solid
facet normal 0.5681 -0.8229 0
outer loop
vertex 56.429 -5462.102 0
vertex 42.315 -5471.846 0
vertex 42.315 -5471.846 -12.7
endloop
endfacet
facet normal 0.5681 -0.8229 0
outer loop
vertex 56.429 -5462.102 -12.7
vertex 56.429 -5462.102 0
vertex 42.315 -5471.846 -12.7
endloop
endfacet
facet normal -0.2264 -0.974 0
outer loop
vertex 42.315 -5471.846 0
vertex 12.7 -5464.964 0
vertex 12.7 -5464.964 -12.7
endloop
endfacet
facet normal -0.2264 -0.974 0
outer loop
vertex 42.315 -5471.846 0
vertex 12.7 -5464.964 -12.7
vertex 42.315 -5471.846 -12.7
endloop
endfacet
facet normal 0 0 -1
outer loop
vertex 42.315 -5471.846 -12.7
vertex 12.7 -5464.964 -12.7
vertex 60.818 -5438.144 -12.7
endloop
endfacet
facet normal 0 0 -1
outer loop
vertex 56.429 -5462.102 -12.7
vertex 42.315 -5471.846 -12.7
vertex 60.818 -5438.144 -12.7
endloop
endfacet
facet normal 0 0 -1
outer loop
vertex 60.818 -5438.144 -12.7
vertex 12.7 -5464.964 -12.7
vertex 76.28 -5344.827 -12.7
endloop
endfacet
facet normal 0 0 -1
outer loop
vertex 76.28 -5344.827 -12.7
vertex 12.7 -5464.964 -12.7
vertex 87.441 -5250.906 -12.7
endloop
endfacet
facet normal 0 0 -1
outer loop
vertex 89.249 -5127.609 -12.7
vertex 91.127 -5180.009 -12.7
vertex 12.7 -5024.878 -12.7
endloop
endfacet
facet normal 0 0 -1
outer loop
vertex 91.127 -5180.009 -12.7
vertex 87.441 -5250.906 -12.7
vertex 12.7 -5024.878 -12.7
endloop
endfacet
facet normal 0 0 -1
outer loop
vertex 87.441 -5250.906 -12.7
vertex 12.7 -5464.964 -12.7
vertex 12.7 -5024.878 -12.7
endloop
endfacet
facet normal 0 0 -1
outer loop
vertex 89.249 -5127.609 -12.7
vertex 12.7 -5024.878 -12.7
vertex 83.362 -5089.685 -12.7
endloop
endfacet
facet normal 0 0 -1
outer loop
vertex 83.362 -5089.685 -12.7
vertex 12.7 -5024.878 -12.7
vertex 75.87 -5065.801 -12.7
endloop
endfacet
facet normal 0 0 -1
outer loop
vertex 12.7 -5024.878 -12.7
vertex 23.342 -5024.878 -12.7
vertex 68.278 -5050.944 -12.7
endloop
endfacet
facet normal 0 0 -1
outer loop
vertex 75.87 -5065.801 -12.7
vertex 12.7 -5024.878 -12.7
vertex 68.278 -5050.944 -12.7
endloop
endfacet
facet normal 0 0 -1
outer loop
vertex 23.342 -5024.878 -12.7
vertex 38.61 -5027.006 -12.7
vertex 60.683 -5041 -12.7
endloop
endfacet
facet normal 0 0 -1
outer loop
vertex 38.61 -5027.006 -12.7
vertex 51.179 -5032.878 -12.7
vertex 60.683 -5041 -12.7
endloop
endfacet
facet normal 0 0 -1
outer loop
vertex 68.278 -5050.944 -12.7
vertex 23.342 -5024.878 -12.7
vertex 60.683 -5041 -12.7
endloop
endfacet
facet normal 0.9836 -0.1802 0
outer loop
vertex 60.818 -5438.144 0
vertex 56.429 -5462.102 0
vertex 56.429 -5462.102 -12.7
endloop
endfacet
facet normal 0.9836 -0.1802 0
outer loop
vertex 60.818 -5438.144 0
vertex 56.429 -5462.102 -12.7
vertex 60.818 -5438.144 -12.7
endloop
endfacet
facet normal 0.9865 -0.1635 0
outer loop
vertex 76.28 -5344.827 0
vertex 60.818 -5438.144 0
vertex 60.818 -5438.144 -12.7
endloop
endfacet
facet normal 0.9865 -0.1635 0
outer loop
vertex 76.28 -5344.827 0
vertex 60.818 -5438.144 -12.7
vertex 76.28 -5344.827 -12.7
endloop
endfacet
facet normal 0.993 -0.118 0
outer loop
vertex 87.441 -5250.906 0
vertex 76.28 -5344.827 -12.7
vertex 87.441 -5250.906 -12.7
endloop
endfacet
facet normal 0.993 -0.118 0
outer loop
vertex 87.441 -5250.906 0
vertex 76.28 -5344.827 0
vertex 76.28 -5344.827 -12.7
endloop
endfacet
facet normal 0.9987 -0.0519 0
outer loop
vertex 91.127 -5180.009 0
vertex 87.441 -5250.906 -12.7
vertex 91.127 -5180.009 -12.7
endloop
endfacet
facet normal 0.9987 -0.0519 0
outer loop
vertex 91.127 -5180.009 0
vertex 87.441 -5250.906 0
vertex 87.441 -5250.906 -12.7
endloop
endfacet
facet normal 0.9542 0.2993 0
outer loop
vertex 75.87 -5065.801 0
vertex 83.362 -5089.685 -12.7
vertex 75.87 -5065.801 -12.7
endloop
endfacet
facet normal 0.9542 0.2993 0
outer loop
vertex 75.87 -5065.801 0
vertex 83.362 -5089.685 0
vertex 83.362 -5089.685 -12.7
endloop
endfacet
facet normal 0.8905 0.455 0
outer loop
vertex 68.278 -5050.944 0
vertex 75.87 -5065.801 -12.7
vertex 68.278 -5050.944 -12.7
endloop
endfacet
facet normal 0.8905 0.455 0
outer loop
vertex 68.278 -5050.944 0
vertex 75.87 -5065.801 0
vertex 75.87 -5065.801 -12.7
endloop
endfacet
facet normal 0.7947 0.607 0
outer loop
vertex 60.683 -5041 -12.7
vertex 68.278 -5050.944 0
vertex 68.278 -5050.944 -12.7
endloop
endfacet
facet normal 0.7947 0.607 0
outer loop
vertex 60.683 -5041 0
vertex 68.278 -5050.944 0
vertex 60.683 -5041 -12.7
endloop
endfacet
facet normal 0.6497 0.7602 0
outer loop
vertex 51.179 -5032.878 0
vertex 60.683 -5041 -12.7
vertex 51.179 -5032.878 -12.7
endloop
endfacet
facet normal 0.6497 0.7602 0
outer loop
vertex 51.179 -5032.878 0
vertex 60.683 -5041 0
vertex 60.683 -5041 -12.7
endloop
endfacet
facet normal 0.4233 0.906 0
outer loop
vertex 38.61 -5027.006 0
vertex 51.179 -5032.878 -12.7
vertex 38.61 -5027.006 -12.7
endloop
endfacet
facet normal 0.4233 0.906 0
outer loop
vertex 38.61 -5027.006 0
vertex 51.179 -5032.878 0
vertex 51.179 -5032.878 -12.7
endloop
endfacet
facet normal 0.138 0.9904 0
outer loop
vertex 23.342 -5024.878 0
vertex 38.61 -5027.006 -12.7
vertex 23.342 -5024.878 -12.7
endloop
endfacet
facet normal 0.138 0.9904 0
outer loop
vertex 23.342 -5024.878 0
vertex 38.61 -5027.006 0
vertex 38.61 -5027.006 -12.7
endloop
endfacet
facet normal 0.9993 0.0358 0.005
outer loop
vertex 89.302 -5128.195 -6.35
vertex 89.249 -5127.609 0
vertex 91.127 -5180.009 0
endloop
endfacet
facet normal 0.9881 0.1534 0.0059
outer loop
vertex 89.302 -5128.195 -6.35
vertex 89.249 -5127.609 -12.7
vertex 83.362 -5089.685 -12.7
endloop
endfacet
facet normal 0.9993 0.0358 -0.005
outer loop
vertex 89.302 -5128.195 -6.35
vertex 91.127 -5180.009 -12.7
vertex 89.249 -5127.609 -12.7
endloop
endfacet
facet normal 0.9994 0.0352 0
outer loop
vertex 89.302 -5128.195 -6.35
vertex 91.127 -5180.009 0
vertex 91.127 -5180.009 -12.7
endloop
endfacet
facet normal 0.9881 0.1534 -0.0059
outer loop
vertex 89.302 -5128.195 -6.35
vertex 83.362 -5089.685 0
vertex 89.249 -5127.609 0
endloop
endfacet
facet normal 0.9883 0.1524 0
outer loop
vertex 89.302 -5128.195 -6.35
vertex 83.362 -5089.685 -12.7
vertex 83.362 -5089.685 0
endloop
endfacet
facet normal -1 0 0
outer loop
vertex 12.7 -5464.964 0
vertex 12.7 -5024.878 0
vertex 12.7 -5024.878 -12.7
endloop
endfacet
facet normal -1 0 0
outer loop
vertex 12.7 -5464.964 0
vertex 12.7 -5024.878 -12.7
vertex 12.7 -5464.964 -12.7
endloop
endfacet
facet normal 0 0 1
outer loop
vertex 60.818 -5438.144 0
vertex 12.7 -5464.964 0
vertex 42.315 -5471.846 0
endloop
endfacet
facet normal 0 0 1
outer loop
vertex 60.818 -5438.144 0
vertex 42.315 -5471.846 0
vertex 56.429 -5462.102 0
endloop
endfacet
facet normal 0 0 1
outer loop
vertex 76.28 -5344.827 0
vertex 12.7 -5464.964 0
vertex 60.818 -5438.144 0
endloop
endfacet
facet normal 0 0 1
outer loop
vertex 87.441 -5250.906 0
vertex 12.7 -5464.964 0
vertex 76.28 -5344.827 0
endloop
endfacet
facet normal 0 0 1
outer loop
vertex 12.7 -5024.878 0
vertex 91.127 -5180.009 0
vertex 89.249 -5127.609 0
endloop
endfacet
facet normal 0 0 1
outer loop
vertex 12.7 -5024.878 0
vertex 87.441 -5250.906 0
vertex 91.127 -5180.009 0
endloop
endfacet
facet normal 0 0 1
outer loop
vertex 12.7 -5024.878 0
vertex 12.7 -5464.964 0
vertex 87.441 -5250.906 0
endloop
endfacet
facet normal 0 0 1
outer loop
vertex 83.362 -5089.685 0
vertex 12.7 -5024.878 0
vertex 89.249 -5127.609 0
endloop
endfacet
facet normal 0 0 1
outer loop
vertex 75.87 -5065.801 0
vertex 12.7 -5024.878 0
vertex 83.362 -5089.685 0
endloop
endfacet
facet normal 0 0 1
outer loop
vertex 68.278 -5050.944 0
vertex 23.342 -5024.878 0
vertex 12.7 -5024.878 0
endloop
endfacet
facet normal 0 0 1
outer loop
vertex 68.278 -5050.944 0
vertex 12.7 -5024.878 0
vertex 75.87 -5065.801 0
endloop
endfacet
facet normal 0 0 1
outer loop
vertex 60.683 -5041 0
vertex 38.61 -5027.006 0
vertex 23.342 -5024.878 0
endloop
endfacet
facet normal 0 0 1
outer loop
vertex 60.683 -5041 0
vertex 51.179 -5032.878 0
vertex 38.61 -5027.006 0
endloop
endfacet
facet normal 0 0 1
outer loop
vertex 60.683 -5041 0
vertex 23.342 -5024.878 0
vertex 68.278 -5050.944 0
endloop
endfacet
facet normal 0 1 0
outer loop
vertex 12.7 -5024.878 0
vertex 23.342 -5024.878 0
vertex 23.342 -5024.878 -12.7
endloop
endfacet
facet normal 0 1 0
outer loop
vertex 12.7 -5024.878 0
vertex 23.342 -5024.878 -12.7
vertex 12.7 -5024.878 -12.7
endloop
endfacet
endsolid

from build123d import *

# Parameters (mm, degrees)
BOSS_EXTRUDE1_DEPTH = 12.7
CHAMFER1_SIZE       = 12.7
CHAMFER1_SIZE2      = 12.14102868


with BuildPart() as part:
    # Sketch2 → Boss-Extrude1 (new body)
    with BuildSketch(Plane.XY):
        Polygon((12.7, -5464.963531619), (54.140557785, -5474.594585325), (136.525, -5024.878404071), (12.7, -5024.878404071), align=None)
    extrude(amount=-BOSS_EXTRUDE1_DEPTH)

    # Fillet1
    # a fillet whose section is not a circle: 406.4, 38.1 mm, written as the material it takes off along each edge
    with BuildSketch(Plane(origin=(136.525, -5024.878404071, 1050.356508865), x_dir=(-0.18019344316526917, -0.9836311925921447, 0), z_dir=(0, 0, -1))) as fillet1_piece_1:
        with BuildLine():
            Bezier((420.142603546, 0), (0, 0), (20.394886876, 111.330615302), weights=[1, 1, 1])
            Line((20.394886876, 111.330615302), (0, 0))
            Line((0, 0), (420.142603546, 0))
        make_face()
    extrude(amount=2113.413017729, mode=Mode.SUBTRACT)

    # Chamfer1
    chamfer1_edges = [part.edges().sort_by_distance(p)[0] for p in [
        (54.140557785, -5474.594585325, -6.35),
    ]]
    chamfer1_side = [part.faces().sort_by_distance(p)[0] for p in [
        (57.479307716, -5456.36917979, -6.35),
    ]]
    chamfer(chamfer1_edges, length=CHAMFER1_SIZE, length2=CHAMFER1_SIZE2, reference=chamfer1_side[0])


solid = part.part
